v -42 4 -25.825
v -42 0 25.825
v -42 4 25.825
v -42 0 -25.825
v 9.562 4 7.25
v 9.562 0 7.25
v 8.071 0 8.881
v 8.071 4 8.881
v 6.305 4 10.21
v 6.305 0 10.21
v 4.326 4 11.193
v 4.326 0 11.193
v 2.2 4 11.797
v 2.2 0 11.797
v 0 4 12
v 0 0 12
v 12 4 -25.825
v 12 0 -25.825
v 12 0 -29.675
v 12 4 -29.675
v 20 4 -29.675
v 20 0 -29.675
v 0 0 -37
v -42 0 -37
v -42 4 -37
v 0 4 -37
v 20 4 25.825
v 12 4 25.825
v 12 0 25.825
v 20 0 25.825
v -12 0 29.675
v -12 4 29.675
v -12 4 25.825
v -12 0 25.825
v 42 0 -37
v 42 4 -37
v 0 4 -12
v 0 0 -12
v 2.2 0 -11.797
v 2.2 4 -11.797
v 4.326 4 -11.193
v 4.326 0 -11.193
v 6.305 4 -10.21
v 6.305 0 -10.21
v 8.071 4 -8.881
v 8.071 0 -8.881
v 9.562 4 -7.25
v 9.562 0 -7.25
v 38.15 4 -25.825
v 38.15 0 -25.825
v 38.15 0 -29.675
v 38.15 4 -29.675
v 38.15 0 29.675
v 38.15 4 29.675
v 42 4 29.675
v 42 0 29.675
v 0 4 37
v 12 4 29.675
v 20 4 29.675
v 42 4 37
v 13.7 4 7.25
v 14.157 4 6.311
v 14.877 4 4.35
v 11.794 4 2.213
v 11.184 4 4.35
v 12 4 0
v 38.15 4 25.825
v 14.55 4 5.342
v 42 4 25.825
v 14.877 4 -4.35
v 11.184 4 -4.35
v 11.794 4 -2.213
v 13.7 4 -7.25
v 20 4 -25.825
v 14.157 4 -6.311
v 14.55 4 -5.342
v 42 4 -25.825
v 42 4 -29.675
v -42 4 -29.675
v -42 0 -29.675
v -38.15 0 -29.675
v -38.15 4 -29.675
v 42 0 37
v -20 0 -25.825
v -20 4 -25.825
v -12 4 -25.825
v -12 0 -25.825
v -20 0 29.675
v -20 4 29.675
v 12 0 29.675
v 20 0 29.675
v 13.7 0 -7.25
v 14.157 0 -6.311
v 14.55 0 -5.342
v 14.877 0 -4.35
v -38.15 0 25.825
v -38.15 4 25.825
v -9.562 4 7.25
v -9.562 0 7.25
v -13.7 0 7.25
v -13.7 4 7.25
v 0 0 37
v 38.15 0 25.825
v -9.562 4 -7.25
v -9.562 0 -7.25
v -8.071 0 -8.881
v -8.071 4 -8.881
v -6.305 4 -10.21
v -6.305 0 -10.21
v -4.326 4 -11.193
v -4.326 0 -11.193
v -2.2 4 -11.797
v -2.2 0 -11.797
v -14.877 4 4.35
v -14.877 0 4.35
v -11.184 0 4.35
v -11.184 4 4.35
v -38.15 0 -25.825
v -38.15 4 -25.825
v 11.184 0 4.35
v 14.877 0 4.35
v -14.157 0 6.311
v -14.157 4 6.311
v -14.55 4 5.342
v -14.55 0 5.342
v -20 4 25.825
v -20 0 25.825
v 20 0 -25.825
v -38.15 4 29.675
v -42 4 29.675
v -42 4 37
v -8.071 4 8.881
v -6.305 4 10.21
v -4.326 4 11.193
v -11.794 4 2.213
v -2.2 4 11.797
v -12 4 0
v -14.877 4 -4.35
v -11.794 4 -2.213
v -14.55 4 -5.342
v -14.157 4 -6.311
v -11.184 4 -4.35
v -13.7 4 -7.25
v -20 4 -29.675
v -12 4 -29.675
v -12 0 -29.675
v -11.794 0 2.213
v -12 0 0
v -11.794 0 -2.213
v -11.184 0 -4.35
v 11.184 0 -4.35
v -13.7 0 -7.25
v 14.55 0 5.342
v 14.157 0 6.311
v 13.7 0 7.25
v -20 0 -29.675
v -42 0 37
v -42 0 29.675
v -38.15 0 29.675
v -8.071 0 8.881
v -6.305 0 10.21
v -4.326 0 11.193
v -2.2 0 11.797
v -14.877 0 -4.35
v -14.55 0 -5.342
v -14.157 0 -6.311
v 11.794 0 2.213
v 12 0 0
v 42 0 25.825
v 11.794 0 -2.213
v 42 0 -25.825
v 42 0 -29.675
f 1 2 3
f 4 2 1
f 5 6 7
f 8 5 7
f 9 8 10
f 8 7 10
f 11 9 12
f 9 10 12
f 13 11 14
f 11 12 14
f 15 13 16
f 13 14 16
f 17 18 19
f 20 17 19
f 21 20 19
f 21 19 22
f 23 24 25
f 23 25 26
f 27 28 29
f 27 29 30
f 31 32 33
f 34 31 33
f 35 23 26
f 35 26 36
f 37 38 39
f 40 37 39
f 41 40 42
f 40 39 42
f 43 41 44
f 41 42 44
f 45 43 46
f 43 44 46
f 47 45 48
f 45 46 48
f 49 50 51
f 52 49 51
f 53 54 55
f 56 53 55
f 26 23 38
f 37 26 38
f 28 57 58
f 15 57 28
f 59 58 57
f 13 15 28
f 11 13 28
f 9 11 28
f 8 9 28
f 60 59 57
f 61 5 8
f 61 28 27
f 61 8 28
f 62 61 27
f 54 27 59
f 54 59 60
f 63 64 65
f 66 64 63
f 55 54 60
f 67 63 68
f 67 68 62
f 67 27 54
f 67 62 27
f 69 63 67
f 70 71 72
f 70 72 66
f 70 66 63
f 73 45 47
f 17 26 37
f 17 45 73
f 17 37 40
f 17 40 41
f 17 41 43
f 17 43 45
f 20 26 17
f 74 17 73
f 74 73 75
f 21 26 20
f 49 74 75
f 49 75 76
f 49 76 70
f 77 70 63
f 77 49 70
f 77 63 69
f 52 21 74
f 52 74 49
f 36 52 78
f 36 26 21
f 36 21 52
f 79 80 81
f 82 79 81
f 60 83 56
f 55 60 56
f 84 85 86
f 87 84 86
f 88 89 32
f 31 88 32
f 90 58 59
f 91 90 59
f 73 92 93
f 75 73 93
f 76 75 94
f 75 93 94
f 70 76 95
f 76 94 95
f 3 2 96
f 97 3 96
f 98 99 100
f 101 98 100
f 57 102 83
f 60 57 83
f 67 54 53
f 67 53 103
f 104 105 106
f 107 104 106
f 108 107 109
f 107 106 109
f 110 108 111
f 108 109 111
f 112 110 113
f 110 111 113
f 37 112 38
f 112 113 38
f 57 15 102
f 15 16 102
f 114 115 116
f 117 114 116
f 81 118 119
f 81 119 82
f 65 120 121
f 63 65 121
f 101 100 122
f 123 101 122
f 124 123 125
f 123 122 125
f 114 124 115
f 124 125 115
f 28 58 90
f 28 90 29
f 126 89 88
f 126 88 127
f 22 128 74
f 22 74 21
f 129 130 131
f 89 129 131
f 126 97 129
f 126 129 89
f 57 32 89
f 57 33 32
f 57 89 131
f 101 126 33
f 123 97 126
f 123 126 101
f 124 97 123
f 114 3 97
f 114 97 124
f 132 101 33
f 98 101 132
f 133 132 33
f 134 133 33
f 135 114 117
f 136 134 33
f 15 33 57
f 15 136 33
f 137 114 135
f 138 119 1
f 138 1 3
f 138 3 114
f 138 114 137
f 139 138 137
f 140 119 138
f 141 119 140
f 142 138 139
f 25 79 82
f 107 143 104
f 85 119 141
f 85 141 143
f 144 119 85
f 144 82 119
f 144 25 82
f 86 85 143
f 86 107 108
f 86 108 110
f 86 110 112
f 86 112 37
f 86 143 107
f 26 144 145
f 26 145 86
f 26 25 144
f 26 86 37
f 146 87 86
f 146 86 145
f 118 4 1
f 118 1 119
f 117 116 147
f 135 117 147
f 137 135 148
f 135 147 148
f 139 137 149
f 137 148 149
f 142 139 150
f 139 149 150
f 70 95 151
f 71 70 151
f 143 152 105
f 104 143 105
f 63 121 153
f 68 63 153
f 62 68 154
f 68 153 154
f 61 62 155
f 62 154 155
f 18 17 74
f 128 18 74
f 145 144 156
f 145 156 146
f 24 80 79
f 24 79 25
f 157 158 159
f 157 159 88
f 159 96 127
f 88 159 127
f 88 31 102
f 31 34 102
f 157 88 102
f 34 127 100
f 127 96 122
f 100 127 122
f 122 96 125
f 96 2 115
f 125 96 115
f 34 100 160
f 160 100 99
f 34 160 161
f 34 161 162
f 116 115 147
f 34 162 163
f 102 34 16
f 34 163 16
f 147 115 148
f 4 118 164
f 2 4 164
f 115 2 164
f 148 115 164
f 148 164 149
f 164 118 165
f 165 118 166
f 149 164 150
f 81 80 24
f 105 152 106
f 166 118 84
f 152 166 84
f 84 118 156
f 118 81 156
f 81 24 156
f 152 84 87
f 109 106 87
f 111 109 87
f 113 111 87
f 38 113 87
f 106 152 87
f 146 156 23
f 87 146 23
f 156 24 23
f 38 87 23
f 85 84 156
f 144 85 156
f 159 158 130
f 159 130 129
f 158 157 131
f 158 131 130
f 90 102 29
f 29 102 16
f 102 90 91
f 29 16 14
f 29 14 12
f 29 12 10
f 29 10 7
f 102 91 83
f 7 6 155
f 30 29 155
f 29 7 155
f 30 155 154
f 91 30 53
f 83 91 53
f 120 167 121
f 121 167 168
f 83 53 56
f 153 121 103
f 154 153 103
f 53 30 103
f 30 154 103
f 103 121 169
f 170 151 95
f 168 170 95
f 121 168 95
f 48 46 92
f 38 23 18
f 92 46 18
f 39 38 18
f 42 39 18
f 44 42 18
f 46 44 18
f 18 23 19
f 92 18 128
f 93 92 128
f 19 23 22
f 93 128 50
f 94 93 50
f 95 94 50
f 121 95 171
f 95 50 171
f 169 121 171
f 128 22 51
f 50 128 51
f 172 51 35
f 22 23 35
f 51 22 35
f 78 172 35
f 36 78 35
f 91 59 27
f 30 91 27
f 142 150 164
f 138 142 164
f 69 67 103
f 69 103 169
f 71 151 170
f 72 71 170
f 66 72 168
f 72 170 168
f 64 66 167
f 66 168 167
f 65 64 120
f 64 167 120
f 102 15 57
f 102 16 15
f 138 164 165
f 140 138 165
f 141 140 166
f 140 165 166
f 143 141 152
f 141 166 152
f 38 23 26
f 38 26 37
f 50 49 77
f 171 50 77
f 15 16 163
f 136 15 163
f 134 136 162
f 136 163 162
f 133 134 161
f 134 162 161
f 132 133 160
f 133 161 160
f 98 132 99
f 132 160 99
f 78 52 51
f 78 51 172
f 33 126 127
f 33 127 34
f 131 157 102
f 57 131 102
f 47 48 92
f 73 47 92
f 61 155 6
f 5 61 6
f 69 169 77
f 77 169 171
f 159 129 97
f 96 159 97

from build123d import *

# Parameters (mm, degrees)
SKETCH2_W               = 84
SKETCH2_H               = 74
BOSS_EXTRUDE1_DEPTH     = 4
SKETCH4_W               = 8
SKETCH4_H               = 3.85
SKETCH4_W_2             = 3.85
CUT_EXTRUDE2_DEPTH      = 1
CUT_EXTRUDE2_DEPTH_BACK = 5


with BuildPart() as part:
    # Sketch2 → Boss-Extrude1 (new body)
    with BuildSketch(Plane(origin=(0, 0, 0), x_dir=(1, 0, 0), z_dir=(0, 1, 0))):
        Rectangle(SKETCH2_W, SKETCH2_H)
        with BuildLine():
            ThreePointArc((11.183805256, 4.35), (12, 0), (11.183805256, -4.35))
            Line((11.183805256, -4.35), (14.877079687, -4.35))
            ThreePointArc((14.877079687, -4.35), (14.361878956, -5.829788405), (13.699908759, -7.25))
            Line((13.699908759, -7.25), (9.562295749, -7.25))
            ThreePointArc((9.562295749, -7.25), (0, -12), (-9.562295749, -7.25))
            Line((-9.562295749, -7.25), (-13.699908759, -7.25))
            ThreePointArc((-13.699908759, -7.25), (-14.361878956, -5.829788405), (-14.877079687, -4.35))
            Line((-14.877079687, -4.35), (-11.183805256, -4.35))
            ThreePointArc((-11.183805256, -4.35), (-12, 0), (-11.183805256, 4.35))
            Line((-11.183805256, 4.35), (-14.877079687, 4.35))
            ThreePointArc((-14.877079687, 4.35), (-14.361878956, 5.829788405), (-13.699908759, 7.25))
            Line((-13.699908759, 7.25), (-9.562295749, 7.25))
            ThreePointArc((-9.562295749, 7.25), (0, 12), (9.562295749, 7.25))
            Line((9.562295749, 7.25), (13.699908759, 7.25))
            ThreePointArc((13.699908759, 7.25), (14.361878956, 5.829788405), (14.877079687, 4.35))
            Line((14.877079687, 4.35), (11.183805256, 4.35))
        make_face(mode=Mode.SUBTRACT)
    extrude(amount=BOSS_EXTRUDE1_DEPTH)


with BuildPart() as body_2:
    # Split1: the piece on the far side of the plane
    add(part.part)
    split(bisect_by=Plane(origin=(0, 0, 0), x_dir=(0, 0, 1), z_dir=(1, 0, 0)), keep=Keep.BOTTOM)


with BuildPart() as part_1:
    add(part.part)

    # Split1
    split(bisect_by=Plane(origin=(0, 0, 0), x_dir=(0, 0, 1), z_dir=(1, 0, 0)), keep=Keep.TOP)


with BuildPart() as cut_extrude2_tool:
    # Sketch4 → Cut-Extrude2 (new body, two sides)
    with BuildSketch(Plane(origin=(0, 4, 0), x_dir=(1, 0, 0), z_dir=(0, 1, 0))) as cut_extrude2_sk:
        with Locations((-16, -27.75)):
            Rectangle(SKETCH4_W, SKETCH4_H)
        with Locations((-40.075, -27.75)):
            Rectangle(SKETCH4_W_2, SKETCH4_H)
        with Locations((40.075, -27.75)):
            Rectangle(SKETCH4_W_2, SKETCH4_H)
        with Locations((16, -27.75)):
            Rectangle(SKETCH4_W, SKETCH4_H)
        with Locations((16, 27.75)):
            Rectangle(SKETCH4_W, SKETCH4_H)
        with Locations((40.075, 27.75)):
            Rectangle(SKETCH4_W_2, SKETCH4_H)
        with Locations((-40.075, 27.75)):
            Rectangle(SKETCH4_W_2, SKETCH4_H)
        with Locations((-16, 27.75)):
            Rectangle(SKETCH4_W, SKETCH4_H)
    extrude(amount=CUT_EXTRUDE2_DEPTH)
    extrude(cut_extrude2_sk.sketch, amount=-CUT_EXTRUDE2_DEPTH_BACK)


with BuildPart() as part_2:
    add(part_1.part)

    # Cut-Extrude2: cut by cut_extrude2_tool
    add(cut_extrude2_tool.part, mode=Mode.SUBTRACT)


with BuildPart() as body_2_1:
    add(body_2.part)

    # Cut-Extrude2: cut by cut_extrude2_tool
    add(cut_extrude2_tool.part, mode=Mode.SUBTRACT)


solid = Compound([part_2.part, body_2_1.part])
